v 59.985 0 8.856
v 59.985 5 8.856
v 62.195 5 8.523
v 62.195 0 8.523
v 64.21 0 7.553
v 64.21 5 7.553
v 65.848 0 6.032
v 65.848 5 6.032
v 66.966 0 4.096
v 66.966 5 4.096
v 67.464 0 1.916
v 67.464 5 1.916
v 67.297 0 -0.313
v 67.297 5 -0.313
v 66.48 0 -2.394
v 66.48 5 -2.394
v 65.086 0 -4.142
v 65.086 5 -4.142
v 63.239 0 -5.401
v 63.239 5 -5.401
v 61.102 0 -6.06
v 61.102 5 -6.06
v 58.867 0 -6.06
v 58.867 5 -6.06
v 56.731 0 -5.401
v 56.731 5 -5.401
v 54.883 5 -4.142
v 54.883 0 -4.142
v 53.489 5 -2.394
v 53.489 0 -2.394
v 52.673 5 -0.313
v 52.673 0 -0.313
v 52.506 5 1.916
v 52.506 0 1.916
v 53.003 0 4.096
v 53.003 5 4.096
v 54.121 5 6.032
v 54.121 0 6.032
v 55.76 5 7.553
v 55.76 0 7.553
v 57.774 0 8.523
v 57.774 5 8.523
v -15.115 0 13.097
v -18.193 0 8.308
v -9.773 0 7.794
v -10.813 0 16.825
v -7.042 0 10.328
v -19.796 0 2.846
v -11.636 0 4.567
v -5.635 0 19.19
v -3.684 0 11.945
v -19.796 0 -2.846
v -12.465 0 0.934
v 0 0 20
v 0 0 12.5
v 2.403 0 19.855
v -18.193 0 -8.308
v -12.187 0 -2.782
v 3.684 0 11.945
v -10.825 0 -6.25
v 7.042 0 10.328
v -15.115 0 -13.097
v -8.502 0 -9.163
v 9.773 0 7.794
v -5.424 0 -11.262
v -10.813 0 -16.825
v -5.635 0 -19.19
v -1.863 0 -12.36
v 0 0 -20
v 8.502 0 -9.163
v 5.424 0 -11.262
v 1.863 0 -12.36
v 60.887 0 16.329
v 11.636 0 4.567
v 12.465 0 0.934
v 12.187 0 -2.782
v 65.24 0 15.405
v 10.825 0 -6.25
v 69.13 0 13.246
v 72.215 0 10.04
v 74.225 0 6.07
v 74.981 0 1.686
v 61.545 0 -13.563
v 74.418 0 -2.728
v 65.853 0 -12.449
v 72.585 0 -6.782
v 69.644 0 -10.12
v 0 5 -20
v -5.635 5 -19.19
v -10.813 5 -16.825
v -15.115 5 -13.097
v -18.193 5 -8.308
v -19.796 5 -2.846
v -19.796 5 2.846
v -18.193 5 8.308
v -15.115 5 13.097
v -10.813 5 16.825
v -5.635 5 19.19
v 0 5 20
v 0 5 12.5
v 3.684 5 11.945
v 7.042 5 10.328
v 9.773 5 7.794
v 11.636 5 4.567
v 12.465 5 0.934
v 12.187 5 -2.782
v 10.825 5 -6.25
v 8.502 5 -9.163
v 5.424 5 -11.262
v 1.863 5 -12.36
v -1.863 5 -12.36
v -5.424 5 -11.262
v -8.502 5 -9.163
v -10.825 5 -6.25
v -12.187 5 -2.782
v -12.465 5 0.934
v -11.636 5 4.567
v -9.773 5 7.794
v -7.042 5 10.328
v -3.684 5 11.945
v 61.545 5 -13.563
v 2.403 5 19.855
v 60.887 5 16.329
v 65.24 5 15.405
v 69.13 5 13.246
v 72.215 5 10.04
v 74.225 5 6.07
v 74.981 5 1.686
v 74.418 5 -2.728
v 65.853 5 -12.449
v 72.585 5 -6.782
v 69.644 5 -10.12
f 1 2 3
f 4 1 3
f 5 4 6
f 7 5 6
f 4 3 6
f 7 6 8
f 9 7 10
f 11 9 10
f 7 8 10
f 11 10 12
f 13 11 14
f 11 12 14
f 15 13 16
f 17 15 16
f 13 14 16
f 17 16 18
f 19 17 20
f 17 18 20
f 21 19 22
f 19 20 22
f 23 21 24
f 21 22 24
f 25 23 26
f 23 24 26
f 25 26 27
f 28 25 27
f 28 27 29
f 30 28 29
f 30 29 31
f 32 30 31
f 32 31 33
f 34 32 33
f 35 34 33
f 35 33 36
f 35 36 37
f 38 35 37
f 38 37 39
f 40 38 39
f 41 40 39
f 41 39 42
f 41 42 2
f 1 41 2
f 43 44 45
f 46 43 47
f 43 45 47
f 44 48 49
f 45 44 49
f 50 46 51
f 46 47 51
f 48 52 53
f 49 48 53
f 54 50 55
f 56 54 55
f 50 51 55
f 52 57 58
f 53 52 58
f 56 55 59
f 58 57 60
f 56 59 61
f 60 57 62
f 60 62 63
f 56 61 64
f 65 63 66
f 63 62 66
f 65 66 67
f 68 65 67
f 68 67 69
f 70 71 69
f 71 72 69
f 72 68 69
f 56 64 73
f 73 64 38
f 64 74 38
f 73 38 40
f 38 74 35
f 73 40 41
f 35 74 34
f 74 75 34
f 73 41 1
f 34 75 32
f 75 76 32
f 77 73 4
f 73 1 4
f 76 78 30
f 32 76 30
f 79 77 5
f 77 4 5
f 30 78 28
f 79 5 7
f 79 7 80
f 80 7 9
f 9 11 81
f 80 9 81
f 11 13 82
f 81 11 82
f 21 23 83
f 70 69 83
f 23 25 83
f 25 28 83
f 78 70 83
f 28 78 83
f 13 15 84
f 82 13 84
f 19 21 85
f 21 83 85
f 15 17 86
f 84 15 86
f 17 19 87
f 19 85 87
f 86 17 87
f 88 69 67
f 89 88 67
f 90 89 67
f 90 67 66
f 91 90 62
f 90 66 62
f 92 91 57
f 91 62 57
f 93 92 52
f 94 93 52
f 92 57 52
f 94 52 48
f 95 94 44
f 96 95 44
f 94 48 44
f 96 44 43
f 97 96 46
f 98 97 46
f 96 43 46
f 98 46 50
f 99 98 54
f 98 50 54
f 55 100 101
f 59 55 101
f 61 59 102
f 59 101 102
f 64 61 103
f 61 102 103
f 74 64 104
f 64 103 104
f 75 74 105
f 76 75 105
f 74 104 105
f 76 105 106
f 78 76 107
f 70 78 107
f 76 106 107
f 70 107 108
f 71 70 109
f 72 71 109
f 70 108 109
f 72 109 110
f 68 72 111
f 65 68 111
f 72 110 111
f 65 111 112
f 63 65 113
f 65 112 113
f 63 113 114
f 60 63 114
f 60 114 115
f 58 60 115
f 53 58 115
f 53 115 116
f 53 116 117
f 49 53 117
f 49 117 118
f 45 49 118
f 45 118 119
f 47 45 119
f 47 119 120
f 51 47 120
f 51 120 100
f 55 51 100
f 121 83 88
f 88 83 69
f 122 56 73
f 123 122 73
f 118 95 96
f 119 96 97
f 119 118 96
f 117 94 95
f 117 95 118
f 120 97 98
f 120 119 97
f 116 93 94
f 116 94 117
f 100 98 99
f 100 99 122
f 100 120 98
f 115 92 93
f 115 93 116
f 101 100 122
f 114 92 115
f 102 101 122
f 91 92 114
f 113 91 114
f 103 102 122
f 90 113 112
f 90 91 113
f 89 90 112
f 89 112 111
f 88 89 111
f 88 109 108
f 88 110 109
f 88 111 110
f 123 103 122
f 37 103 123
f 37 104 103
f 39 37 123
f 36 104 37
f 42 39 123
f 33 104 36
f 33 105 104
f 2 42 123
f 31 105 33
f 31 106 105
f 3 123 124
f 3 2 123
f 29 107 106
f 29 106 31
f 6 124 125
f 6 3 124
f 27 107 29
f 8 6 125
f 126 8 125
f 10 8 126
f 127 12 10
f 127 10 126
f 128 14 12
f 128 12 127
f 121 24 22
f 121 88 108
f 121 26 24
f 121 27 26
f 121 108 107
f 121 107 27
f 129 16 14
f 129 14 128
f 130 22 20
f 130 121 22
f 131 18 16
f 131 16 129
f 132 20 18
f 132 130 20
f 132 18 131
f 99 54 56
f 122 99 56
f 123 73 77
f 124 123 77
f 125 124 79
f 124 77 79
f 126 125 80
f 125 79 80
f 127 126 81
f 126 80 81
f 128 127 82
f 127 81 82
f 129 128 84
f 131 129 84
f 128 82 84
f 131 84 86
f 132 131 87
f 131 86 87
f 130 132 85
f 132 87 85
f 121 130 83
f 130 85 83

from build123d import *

# Parameters (mm, degrees)
BOSS_EXTRUDE1_DEPTH = 5
SKETCH2_R           = 12.5
SKETCH2_R_2         = 7.5
CUT_EXTRUDE1_DEPTH  = 10


with BuildPart() as part:
    # Sketch1 → Boss-Extrude1 (new body)
    with BuildSketch(Plane(origin=(0, 0, 0), x_dir=(1, 0, 0), z_dir=(0, 1, 0))):
        with BuildLine():
            Line((61.545103008, 13.562628278), (0, 20))
            ThreePointArc((0, 20), (-20, 0), (0, -20))
            Line((0, -20), (2.403061157, -19.855107582))
            Line((2.403061157, -19.855107582), (60.887460049, -16.328794499))
            ThreePointArc((60.887460049, -16.328794499), (74.981046517, -1.685922519), (61.545103008, 13.562628278))
        make_face()
    extrude(amount=BOSS_EXTRUDE1_DEPTH)

    # Sketch2 → Cut-Extrude1 (cut)
    with BuildSketch(Plane(origin=(0, 5, 0), x_dir=(1, 0, 0), z_dir=(0, 1, 0))):
        with Locations(Location((0, 0, 0), (0, 0, 270))):
            Circle(SKETCH2_R)
        with Locations(Location((59.984675549, -1.355986475, 0), (0, 0, 270))):
            Circle(SKETCH2_R_2)
    extrude(amount=-CUT_EXTRUDE1_DEPTH, mode=Mode.SUBTRACT)


solid = part.part
